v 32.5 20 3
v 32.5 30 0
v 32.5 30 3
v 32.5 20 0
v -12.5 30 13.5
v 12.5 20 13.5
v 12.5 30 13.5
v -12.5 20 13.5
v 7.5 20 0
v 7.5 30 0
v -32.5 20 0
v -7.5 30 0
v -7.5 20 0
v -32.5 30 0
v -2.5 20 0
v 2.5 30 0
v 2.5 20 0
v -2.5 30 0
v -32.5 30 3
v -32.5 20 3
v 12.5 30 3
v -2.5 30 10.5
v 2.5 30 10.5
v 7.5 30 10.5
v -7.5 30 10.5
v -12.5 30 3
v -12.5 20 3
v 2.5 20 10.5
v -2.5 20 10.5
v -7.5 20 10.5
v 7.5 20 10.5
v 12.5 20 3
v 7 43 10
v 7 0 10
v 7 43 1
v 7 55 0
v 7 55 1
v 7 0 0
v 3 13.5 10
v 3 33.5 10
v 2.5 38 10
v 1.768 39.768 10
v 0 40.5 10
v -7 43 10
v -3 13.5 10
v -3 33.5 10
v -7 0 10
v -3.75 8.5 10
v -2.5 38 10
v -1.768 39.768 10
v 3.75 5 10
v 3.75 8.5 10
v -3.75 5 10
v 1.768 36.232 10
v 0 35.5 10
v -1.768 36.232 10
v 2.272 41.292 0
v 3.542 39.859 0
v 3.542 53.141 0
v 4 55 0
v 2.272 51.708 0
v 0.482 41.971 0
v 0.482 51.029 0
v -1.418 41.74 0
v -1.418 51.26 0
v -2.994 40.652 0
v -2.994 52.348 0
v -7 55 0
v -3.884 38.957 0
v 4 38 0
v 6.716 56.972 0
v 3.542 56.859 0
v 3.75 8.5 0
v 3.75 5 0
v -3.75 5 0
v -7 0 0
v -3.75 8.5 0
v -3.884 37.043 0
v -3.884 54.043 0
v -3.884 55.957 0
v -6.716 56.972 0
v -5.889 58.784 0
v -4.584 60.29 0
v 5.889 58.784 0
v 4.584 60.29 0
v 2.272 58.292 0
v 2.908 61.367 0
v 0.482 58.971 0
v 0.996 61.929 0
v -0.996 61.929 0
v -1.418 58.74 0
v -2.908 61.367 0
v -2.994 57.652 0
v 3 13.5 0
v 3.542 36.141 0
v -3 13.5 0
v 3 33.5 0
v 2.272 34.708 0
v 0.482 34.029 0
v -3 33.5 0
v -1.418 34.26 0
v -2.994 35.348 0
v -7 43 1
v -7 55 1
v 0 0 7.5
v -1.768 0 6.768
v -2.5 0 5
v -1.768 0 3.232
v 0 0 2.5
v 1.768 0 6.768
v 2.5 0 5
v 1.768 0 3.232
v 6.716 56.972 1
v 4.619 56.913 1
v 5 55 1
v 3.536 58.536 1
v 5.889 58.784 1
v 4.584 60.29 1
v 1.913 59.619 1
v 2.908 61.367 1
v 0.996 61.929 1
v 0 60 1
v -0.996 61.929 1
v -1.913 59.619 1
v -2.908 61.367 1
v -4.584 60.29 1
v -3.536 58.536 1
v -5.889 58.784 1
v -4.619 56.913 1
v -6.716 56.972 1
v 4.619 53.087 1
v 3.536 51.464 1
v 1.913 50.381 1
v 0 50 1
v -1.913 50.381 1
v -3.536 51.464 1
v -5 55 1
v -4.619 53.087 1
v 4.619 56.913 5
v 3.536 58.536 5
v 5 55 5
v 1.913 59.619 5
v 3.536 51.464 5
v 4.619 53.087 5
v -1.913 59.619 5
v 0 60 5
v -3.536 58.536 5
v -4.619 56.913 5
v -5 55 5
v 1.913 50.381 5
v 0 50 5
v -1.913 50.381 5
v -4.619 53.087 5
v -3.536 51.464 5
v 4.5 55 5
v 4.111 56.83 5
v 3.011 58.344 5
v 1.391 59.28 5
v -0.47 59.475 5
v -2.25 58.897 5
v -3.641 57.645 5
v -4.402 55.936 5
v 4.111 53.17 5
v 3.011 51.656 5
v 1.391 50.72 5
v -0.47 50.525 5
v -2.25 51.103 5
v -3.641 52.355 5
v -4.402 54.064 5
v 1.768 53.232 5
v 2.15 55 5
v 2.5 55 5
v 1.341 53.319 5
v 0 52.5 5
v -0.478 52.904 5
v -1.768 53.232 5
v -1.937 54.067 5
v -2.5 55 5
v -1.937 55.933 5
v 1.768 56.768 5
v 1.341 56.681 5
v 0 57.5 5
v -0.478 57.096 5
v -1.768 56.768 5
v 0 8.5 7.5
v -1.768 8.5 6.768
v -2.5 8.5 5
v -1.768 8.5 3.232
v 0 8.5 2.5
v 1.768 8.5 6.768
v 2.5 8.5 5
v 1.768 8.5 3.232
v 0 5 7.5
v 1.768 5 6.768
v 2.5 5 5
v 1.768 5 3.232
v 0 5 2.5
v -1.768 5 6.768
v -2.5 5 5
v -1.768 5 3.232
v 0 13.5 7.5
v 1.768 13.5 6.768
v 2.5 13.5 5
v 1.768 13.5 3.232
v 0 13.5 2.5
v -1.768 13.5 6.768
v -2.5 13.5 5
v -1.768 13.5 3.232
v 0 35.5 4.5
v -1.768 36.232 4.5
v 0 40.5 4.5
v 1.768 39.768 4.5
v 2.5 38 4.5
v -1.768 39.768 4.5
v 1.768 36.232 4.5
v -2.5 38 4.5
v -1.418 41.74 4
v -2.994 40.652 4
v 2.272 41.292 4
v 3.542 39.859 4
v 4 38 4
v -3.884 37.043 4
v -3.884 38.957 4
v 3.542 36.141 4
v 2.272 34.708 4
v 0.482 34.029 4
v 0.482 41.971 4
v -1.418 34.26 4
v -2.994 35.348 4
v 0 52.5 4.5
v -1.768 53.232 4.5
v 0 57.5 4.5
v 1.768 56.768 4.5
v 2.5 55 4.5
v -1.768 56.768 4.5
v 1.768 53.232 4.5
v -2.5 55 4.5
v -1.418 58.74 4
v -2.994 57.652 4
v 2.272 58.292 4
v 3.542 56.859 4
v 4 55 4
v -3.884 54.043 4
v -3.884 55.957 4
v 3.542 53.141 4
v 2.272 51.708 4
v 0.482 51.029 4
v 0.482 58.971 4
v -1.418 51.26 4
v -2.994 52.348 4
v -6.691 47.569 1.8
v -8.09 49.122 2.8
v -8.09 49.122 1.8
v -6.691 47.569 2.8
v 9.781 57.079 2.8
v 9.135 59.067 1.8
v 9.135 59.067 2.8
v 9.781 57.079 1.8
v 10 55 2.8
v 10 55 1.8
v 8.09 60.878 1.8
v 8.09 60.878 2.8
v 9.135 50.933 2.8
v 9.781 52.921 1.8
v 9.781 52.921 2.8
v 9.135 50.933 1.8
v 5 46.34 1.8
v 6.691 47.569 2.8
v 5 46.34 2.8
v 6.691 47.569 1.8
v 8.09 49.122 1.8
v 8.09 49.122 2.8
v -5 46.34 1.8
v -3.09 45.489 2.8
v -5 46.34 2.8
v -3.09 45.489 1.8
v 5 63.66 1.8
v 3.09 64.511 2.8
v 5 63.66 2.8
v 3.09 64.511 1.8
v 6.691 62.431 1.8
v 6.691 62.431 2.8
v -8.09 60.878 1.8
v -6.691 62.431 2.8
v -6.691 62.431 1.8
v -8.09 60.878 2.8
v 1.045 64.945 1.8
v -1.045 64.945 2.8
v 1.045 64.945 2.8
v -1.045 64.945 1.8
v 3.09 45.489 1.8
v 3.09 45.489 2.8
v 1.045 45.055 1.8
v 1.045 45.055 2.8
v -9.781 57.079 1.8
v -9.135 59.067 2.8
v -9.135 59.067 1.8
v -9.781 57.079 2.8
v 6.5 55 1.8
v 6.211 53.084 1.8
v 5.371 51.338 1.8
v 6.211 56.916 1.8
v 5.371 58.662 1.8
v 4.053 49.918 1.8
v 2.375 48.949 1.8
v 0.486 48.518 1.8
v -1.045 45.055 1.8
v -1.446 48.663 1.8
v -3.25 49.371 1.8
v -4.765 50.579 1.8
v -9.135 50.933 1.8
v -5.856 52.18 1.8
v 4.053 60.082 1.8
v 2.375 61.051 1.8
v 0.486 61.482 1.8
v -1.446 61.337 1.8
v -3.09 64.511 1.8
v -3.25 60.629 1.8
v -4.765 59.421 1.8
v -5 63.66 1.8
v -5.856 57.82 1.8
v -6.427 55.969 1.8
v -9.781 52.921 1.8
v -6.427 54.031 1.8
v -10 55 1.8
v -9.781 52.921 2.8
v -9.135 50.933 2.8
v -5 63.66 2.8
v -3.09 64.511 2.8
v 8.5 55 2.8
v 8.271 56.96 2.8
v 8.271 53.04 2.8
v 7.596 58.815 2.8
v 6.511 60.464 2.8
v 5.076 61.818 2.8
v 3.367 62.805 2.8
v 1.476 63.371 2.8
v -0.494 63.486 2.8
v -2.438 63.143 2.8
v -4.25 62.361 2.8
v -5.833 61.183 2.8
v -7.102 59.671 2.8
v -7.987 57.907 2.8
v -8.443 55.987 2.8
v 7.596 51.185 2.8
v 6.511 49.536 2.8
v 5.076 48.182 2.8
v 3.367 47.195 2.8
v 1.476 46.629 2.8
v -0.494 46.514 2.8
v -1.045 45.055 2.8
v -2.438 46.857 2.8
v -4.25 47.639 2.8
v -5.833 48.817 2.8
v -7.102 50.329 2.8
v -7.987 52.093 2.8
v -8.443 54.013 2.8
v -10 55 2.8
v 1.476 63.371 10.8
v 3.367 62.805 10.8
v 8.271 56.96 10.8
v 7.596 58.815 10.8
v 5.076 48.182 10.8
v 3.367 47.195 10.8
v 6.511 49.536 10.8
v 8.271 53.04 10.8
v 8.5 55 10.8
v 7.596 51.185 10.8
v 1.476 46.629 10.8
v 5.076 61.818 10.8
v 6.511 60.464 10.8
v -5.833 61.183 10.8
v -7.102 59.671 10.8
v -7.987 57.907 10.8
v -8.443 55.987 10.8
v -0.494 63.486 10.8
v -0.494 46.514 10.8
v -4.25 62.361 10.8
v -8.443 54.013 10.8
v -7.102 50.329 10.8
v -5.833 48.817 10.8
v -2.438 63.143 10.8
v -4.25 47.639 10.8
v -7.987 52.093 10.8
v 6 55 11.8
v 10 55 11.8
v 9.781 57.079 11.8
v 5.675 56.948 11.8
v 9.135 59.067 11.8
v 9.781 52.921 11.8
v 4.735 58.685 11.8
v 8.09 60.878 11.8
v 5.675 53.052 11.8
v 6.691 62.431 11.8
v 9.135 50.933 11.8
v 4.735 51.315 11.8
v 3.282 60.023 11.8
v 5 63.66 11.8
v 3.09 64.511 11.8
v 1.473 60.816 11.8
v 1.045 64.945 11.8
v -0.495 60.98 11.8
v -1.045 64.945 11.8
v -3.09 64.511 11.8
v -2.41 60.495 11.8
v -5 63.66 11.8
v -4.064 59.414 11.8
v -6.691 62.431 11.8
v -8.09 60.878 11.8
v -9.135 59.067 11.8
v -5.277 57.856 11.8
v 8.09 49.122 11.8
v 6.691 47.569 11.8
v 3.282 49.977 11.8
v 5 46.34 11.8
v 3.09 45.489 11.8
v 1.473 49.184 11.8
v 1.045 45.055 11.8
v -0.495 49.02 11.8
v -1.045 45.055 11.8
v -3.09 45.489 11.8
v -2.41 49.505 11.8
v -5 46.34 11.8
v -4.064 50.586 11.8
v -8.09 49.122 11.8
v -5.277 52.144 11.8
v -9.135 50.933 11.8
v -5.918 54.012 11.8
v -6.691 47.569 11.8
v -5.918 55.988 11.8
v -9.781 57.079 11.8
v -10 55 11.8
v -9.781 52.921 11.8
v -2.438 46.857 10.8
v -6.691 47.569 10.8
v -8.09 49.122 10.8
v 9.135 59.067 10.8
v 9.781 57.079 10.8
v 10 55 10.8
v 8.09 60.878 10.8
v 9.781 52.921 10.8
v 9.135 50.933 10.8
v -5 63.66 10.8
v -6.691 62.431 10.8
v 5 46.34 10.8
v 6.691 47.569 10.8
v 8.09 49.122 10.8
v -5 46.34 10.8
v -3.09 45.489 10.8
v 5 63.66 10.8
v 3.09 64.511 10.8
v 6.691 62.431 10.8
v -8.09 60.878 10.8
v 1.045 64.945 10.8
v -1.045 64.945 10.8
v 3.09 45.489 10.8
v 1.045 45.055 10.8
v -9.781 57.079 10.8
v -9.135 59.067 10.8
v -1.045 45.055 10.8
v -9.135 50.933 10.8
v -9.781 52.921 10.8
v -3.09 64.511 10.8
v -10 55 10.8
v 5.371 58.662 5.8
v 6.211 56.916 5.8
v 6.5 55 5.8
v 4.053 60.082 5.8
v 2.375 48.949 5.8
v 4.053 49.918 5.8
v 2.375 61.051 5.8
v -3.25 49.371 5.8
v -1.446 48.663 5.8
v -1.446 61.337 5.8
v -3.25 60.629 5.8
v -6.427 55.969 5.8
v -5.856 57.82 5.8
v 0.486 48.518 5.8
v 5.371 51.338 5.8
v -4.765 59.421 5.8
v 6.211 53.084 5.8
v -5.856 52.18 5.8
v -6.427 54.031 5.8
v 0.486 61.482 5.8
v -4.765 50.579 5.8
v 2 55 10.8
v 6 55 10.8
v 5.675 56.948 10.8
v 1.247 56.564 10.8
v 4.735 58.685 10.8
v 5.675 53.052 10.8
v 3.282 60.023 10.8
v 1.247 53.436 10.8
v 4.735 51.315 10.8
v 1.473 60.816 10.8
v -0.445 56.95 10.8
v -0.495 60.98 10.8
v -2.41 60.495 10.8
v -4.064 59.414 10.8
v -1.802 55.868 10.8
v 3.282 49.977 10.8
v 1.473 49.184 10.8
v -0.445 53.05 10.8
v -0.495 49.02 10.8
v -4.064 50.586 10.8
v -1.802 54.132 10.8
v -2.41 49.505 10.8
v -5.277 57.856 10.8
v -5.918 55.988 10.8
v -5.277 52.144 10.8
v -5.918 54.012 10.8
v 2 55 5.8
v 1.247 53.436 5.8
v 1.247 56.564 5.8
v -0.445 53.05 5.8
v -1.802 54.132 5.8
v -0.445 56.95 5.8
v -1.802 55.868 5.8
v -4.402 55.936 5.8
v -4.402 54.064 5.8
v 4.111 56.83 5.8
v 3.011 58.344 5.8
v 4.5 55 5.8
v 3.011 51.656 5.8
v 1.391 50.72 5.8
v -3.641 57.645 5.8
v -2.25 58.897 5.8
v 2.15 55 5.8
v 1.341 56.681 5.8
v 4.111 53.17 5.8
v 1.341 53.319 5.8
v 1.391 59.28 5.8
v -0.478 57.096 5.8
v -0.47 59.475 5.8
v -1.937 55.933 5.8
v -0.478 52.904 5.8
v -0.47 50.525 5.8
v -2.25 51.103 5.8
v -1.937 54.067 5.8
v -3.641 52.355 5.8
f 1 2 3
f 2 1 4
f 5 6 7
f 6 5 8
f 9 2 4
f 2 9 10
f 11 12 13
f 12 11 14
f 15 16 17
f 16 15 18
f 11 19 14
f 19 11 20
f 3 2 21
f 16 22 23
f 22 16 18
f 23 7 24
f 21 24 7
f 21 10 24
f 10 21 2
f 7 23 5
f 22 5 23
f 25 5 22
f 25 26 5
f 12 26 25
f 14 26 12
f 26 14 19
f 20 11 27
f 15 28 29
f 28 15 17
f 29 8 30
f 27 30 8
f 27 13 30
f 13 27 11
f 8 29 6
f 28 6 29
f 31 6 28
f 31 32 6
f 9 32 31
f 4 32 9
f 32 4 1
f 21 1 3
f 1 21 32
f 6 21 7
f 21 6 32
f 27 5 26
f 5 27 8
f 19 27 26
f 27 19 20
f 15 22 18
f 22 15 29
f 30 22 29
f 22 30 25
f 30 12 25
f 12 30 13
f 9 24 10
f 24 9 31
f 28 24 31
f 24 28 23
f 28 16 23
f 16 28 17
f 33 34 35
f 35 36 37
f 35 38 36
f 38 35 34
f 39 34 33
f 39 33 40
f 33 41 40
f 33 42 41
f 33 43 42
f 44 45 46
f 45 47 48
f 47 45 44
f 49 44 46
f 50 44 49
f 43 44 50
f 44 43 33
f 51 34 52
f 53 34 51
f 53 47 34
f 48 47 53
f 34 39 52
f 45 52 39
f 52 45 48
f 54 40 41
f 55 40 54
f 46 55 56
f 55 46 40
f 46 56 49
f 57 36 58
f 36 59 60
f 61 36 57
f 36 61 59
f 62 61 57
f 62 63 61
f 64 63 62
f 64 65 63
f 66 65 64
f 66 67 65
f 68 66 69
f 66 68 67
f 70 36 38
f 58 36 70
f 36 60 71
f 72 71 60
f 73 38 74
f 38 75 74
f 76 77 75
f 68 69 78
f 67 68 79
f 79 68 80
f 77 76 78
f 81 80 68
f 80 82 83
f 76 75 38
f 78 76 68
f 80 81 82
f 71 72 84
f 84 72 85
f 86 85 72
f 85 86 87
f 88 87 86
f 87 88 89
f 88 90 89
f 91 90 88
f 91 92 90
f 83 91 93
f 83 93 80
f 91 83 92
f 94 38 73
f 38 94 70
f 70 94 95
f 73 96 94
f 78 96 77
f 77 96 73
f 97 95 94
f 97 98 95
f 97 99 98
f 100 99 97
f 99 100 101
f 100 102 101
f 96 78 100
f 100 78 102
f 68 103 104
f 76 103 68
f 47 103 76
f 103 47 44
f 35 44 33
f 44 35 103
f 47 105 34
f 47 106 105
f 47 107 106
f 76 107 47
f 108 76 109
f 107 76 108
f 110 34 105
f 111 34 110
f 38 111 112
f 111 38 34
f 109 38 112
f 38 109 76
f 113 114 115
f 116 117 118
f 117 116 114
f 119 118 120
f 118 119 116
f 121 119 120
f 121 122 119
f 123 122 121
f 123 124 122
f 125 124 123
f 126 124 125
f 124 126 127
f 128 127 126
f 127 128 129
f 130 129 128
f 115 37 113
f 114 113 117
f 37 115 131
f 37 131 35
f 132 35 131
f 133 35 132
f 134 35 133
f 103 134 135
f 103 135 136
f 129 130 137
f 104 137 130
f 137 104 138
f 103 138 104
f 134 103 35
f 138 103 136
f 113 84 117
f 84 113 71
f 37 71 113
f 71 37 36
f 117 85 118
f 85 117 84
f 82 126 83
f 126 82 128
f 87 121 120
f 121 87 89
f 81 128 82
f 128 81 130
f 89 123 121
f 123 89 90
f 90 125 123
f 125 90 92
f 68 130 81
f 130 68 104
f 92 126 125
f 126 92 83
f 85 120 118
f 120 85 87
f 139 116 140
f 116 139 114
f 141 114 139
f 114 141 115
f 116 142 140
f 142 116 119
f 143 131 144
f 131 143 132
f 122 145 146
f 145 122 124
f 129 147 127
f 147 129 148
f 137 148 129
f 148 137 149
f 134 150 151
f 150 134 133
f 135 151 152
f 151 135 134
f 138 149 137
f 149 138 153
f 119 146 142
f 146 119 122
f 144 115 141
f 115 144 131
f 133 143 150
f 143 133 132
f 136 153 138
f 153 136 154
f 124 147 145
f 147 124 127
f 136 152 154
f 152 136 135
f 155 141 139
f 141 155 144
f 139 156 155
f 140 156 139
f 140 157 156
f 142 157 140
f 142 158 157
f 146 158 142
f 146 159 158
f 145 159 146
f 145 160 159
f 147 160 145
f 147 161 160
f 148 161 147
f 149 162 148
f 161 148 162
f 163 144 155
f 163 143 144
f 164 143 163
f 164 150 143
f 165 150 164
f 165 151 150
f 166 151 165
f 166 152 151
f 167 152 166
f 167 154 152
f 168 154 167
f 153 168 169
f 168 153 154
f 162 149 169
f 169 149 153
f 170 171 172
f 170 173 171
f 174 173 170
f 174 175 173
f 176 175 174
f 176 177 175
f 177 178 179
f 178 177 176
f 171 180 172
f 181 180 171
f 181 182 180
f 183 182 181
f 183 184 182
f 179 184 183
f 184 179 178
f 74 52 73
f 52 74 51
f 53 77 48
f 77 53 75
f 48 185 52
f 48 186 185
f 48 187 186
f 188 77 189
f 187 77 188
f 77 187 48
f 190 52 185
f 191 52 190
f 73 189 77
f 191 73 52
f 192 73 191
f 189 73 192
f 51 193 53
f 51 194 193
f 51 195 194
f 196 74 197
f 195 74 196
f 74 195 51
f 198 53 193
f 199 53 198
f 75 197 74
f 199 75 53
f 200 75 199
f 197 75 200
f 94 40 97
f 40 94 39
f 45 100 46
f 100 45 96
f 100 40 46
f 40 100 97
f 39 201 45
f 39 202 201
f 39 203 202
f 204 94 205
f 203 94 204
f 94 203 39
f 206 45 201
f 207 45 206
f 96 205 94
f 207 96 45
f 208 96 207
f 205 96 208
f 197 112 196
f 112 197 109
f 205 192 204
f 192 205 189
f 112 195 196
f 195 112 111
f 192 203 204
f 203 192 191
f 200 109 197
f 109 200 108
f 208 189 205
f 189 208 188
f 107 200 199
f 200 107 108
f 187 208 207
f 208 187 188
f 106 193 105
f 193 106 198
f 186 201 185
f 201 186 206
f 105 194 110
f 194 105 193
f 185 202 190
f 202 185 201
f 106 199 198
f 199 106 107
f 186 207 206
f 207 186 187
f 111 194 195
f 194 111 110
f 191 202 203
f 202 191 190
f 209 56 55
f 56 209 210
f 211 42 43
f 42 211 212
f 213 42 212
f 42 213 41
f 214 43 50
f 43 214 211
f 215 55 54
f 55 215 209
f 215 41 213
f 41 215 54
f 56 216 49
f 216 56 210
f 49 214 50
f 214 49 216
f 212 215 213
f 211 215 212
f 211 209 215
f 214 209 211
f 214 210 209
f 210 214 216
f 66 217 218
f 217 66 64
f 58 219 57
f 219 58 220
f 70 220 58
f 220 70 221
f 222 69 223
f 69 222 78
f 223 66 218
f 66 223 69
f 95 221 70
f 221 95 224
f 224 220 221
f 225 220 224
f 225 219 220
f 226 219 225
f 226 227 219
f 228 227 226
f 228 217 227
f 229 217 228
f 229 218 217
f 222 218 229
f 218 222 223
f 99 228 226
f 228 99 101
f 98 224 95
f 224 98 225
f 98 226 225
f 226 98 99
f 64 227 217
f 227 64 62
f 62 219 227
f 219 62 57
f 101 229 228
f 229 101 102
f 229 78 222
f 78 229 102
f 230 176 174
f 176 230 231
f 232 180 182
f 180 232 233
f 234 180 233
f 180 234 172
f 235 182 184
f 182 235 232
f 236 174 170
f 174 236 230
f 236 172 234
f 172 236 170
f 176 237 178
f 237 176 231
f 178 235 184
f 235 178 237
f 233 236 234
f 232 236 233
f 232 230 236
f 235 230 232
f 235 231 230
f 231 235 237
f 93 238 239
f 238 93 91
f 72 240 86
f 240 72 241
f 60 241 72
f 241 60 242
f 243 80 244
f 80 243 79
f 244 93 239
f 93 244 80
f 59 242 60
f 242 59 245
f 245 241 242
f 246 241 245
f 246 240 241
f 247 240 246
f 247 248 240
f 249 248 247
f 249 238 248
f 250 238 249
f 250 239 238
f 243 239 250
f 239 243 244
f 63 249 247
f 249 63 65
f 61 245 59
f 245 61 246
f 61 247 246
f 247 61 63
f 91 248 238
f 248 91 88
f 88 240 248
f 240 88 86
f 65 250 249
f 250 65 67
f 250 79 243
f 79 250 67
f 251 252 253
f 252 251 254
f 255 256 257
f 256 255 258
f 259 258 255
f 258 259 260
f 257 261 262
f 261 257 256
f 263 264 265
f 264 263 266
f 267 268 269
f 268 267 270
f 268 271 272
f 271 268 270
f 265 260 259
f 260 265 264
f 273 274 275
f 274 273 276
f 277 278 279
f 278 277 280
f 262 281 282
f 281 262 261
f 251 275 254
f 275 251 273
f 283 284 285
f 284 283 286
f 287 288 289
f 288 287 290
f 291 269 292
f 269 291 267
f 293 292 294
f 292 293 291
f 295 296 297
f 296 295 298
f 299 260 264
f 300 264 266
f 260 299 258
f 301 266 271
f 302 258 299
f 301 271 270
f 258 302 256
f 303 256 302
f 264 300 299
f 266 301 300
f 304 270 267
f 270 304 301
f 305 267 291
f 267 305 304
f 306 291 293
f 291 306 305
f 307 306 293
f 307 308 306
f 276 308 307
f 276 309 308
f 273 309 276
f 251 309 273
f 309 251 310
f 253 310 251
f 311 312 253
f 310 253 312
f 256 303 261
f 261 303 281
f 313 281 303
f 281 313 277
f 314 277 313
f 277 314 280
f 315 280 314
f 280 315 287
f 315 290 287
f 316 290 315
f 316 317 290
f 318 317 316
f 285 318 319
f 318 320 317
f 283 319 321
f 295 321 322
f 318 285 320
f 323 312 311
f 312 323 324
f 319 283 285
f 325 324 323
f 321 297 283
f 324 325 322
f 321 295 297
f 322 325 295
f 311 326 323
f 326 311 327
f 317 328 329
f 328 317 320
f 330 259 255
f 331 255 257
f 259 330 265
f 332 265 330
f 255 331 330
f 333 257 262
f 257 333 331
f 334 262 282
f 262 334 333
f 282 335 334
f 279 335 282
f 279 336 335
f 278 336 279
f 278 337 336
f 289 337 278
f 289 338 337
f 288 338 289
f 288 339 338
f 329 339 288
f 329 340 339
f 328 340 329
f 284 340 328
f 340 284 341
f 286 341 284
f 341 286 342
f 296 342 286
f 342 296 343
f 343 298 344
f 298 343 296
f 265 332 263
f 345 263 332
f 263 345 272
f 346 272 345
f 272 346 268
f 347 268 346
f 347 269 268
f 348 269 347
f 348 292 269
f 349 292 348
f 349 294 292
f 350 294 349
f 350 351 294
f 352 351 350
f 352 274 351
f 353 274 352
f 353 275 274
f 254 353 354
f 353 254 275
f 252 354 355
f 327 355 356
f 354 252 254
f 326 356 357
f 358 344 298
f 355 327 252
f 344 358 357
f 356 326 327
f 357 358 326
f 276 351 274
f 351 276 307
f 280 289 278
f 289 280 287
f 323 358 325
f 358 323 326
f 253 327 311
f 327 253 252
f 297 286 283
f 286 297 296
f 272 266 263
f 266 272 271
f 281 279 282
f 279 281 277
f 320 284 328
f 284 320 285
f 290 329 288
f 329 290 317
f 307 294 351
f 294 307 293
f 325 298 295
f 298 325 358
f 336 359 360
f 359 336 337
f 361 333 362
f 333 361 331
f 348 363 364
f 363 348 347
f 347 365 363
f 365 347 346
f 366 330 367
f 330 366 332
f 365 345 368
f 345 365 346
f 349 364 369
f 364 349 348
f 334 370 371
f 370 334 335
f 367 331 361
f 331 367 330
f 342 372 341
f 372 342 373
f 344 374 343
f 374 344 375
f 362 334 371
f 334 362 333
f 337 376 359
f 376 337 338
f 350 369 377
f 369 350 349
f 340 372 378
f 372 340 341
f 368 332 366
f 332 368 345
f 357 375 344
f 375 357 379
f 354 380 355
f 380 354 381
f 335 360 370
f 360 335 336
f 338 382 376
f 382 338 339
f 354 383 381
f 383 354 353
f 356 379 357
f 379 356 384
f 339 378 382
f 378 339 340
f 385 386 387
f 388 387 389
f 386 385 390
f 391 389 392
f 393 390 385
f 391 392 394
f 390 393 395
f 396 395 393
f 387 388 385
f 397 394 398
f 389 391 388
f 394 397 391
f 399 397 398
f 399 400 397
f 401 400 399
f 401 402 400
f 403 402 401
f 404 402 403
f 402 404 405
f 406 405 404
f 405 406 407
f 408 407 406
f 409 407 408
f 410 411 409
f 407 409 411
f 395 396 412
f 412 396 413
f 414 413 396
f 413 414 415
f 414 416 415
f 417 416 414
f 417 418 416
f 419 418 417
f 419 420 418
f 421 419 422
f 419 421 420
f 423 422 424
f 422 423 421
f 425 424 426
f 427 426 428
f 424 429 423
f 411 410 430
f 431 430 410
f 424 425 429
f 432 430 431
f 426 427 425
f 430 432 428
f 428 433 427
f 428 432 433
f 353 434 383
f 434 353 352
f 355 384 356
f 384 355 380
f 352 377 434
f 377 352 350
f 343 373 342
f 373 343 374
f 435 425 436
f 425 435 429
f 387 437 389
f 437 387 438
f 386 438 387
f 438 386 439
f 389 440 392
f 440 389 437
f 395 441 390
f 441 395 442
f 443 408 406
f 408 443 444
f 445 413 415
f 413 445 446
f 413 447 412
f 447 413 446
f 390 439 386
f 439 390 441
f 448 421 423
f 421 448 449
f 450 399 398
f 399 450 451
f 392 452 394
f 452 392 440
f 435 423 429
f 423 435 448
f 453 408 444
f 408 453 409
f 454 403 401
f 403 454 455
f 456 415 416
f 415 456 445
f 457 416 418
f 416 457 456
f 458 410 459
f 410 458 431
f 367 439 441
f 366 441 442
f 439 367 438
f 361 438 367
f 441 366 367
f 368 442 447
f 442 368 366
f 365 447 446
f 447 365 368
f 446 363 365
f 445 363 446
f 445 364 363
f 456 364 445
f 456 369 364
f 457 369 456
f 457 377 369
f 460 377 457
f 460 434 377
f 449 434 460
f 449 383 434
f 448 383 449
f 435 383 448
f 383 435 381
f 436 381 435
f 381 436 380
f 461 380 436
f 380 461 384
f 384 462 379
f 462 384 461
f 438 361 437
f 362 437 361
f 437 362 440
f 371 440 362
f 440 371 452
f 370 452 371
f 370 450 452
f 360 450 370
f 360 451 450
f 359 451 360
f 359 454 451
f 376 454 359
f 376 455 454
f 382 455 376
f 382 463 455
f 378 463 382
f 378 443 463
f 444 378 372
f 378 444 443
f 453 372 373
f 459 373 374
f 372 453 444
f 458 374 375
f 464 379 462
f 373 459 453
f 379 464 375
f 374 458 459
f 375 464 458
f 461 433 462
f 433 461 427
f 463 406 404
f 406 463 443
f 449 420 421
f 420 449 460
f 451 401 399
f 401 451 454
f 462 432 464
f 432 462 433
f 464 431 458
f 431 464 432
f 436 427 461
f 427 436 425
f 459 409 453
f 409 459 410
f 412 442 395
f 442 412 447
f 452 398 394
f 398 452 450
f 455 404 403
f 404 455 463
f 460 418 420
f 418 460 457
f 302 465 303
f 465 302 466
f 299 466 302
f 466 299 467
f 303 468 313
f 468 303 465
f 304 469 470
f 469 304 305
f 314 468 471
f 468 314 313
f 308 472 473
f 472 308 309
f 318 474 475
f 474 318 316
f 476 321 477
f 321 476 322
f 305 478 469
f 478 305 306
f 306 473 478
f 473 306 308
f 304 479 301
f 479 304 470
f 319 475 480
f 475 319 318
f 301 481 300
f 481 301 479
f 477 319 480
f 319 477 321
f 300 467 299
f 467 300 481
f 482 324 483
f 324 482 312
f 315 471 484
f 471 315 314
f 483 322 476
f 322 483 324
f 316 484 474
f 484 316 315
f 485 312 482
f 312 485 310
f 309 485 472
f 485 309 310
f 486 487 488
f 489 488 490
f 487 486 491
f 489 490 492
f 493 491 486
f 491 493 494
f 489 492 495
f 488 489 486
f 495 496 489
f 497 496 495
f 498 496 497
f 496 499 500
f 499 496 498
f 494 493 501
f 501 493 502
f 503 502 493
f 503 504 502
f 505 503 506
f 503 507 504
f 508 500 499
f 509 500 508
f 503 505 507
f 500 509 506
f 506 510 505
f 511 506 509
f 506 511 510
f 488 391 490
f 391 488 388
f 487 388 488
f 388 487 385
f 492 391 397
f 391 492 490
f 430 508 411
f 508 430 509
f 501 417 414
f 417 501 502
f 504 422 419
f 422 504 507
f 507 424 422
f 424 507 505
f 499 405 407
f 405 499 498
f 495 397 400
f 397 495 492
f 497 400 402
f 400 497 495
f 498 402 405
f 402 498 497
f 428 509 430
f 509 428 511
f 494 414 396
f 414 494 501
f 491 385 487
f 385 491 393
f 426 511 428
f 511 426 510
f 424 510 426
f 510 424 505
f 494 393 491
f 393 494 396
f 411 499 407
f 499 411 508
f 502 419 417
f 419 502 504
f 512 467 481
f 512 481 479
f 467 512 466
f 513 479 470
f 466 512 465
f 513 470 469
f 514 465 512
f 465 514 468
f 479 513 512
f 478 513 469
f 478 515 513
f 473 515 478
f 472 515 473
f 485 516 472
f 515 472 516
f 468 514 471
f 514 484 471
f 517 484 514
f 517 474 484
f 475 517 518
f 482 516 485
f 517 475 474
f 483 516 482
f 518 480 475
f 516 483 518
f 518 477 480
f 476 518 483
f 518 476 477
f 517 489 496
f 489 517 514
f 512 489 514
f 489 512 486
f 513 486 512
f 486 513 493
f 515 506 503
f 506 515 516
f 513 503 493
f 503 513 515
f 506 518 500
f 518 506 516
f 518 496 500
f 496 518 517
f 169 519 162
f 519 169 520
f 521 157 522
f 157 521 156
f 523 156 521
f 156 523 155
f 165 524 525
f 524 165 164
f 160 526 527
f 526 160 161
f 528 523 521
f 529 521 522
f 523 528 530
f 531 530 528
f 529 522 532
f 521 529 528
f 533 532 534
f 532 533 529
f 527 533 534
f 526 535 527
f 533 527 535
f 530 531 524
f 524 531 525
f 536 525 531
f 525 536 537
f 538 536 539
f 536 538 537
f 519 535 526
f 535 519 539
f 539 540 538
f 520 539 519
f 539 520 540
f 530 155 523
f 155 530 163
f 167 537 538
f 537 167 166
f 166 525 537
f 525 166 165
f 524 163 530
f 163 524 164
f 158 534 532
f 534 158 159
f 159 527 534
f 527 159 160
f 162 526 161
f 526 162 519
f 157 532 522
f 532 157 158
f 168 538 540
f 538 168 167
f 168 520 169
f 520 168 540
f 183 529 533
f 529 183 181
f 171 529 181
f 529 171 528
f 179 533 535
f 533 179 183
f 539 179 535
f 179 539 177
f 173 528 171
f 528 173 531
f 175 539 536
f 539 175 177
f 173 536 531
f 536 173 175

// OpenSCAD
///////////////////////////////////////////////////////////////////////////////////
// Parts for building a 3D Printer with aluminium extrusions an makerslide parts //
//                                                                               //
//  These are simple parts for using with FreeCAD (openscad module needed.       //
//  The parts are refined inside FreeCAD                                         //
//                                                                               //
//  (c) Holger Pasligh                                                           //
//  You can use this parts for your own purpose, as long you did not sell them   //
//                                                                               //
///////////////////////////////////////////////////////////////////////////////////


// belt tensioner for y-axis
// mounts on aluminum extrusion, adjustable
// additional parts: screws, nuts, washers and bearing 624

//vars
m_w = 10;
m_l = 65;
m_h = 13.5;
m_f = 20;

//output
translate([0,20,0])mounting();
idlerHolder();
translate([0,55,1.8])idler();
translate([0,55,5])washer_bearing();

//construction
module mounting(){
difference(){
translate([-m_l/2,0,0])cube([m_l,m_w,m_h]);
translate([m_l/2-m_f,-1,3])cube([m_f+1,m_w+2,m_h]);
translate([-m_l/2-1,-1,3])cube([m_f+1,m_w+2,m_h]);
translate([-2.5-5,-1,-3])cube([5,m_w+2,m_h]);
translate([2.5,-1,-3])cube([5,m_w+2,m_h]);
}
}

module idlerHolder(){
difference(){
union(){
translate([-14/2,0,0])cube([14,43,10]);
translate([-14/2,0,0])cube([14,55,1]);
translate([0,55,0])cylinder(r=7,h=1);
translate([0,55,0])cylinder(r=5,h=5);
}
translate([-7.5/2,5,-1])cube([7.5,3.5,12]);
translate([-6/2,13.5,-1])cube([6,20,12]);
translate([0,-10,5])rotate([-90,0,0])cylinder(r=2.5, h=30);
translate([0,38,4.5])cylinder(r=2.5, h=30);
translate([0,38,-1])cylinder(r=4, h=5);
translate([0,55,4.5])cylinder(r=2.5, h=30);
translate([0,55,-1])cylinder(r=4, h=5);
}
}

module idler(){
difference(){
union(){
cylinder(r=10,h=1);
cylinder(r=8.5,h=10);
translate([0,0,9])cylinder(r=10,h=1);
}
translate([0,0,-1])cylinder(r=6.5,h=10);
translate([0,0,1])cylinder(r=6,h=10);
}
}

module washer_bearing(){
union(){
	translate([0,0,0.8])difference(){
		cylinder(r=6.5,h=5);
		translate([0,0,-1])cylinder(r=2,h=7);
	}
	difference(){
		cylinder(r=4.5,h=0.8);
		translate([0,0,-1])cylinder(r=2.15,h=2.8);
	}
}
}
